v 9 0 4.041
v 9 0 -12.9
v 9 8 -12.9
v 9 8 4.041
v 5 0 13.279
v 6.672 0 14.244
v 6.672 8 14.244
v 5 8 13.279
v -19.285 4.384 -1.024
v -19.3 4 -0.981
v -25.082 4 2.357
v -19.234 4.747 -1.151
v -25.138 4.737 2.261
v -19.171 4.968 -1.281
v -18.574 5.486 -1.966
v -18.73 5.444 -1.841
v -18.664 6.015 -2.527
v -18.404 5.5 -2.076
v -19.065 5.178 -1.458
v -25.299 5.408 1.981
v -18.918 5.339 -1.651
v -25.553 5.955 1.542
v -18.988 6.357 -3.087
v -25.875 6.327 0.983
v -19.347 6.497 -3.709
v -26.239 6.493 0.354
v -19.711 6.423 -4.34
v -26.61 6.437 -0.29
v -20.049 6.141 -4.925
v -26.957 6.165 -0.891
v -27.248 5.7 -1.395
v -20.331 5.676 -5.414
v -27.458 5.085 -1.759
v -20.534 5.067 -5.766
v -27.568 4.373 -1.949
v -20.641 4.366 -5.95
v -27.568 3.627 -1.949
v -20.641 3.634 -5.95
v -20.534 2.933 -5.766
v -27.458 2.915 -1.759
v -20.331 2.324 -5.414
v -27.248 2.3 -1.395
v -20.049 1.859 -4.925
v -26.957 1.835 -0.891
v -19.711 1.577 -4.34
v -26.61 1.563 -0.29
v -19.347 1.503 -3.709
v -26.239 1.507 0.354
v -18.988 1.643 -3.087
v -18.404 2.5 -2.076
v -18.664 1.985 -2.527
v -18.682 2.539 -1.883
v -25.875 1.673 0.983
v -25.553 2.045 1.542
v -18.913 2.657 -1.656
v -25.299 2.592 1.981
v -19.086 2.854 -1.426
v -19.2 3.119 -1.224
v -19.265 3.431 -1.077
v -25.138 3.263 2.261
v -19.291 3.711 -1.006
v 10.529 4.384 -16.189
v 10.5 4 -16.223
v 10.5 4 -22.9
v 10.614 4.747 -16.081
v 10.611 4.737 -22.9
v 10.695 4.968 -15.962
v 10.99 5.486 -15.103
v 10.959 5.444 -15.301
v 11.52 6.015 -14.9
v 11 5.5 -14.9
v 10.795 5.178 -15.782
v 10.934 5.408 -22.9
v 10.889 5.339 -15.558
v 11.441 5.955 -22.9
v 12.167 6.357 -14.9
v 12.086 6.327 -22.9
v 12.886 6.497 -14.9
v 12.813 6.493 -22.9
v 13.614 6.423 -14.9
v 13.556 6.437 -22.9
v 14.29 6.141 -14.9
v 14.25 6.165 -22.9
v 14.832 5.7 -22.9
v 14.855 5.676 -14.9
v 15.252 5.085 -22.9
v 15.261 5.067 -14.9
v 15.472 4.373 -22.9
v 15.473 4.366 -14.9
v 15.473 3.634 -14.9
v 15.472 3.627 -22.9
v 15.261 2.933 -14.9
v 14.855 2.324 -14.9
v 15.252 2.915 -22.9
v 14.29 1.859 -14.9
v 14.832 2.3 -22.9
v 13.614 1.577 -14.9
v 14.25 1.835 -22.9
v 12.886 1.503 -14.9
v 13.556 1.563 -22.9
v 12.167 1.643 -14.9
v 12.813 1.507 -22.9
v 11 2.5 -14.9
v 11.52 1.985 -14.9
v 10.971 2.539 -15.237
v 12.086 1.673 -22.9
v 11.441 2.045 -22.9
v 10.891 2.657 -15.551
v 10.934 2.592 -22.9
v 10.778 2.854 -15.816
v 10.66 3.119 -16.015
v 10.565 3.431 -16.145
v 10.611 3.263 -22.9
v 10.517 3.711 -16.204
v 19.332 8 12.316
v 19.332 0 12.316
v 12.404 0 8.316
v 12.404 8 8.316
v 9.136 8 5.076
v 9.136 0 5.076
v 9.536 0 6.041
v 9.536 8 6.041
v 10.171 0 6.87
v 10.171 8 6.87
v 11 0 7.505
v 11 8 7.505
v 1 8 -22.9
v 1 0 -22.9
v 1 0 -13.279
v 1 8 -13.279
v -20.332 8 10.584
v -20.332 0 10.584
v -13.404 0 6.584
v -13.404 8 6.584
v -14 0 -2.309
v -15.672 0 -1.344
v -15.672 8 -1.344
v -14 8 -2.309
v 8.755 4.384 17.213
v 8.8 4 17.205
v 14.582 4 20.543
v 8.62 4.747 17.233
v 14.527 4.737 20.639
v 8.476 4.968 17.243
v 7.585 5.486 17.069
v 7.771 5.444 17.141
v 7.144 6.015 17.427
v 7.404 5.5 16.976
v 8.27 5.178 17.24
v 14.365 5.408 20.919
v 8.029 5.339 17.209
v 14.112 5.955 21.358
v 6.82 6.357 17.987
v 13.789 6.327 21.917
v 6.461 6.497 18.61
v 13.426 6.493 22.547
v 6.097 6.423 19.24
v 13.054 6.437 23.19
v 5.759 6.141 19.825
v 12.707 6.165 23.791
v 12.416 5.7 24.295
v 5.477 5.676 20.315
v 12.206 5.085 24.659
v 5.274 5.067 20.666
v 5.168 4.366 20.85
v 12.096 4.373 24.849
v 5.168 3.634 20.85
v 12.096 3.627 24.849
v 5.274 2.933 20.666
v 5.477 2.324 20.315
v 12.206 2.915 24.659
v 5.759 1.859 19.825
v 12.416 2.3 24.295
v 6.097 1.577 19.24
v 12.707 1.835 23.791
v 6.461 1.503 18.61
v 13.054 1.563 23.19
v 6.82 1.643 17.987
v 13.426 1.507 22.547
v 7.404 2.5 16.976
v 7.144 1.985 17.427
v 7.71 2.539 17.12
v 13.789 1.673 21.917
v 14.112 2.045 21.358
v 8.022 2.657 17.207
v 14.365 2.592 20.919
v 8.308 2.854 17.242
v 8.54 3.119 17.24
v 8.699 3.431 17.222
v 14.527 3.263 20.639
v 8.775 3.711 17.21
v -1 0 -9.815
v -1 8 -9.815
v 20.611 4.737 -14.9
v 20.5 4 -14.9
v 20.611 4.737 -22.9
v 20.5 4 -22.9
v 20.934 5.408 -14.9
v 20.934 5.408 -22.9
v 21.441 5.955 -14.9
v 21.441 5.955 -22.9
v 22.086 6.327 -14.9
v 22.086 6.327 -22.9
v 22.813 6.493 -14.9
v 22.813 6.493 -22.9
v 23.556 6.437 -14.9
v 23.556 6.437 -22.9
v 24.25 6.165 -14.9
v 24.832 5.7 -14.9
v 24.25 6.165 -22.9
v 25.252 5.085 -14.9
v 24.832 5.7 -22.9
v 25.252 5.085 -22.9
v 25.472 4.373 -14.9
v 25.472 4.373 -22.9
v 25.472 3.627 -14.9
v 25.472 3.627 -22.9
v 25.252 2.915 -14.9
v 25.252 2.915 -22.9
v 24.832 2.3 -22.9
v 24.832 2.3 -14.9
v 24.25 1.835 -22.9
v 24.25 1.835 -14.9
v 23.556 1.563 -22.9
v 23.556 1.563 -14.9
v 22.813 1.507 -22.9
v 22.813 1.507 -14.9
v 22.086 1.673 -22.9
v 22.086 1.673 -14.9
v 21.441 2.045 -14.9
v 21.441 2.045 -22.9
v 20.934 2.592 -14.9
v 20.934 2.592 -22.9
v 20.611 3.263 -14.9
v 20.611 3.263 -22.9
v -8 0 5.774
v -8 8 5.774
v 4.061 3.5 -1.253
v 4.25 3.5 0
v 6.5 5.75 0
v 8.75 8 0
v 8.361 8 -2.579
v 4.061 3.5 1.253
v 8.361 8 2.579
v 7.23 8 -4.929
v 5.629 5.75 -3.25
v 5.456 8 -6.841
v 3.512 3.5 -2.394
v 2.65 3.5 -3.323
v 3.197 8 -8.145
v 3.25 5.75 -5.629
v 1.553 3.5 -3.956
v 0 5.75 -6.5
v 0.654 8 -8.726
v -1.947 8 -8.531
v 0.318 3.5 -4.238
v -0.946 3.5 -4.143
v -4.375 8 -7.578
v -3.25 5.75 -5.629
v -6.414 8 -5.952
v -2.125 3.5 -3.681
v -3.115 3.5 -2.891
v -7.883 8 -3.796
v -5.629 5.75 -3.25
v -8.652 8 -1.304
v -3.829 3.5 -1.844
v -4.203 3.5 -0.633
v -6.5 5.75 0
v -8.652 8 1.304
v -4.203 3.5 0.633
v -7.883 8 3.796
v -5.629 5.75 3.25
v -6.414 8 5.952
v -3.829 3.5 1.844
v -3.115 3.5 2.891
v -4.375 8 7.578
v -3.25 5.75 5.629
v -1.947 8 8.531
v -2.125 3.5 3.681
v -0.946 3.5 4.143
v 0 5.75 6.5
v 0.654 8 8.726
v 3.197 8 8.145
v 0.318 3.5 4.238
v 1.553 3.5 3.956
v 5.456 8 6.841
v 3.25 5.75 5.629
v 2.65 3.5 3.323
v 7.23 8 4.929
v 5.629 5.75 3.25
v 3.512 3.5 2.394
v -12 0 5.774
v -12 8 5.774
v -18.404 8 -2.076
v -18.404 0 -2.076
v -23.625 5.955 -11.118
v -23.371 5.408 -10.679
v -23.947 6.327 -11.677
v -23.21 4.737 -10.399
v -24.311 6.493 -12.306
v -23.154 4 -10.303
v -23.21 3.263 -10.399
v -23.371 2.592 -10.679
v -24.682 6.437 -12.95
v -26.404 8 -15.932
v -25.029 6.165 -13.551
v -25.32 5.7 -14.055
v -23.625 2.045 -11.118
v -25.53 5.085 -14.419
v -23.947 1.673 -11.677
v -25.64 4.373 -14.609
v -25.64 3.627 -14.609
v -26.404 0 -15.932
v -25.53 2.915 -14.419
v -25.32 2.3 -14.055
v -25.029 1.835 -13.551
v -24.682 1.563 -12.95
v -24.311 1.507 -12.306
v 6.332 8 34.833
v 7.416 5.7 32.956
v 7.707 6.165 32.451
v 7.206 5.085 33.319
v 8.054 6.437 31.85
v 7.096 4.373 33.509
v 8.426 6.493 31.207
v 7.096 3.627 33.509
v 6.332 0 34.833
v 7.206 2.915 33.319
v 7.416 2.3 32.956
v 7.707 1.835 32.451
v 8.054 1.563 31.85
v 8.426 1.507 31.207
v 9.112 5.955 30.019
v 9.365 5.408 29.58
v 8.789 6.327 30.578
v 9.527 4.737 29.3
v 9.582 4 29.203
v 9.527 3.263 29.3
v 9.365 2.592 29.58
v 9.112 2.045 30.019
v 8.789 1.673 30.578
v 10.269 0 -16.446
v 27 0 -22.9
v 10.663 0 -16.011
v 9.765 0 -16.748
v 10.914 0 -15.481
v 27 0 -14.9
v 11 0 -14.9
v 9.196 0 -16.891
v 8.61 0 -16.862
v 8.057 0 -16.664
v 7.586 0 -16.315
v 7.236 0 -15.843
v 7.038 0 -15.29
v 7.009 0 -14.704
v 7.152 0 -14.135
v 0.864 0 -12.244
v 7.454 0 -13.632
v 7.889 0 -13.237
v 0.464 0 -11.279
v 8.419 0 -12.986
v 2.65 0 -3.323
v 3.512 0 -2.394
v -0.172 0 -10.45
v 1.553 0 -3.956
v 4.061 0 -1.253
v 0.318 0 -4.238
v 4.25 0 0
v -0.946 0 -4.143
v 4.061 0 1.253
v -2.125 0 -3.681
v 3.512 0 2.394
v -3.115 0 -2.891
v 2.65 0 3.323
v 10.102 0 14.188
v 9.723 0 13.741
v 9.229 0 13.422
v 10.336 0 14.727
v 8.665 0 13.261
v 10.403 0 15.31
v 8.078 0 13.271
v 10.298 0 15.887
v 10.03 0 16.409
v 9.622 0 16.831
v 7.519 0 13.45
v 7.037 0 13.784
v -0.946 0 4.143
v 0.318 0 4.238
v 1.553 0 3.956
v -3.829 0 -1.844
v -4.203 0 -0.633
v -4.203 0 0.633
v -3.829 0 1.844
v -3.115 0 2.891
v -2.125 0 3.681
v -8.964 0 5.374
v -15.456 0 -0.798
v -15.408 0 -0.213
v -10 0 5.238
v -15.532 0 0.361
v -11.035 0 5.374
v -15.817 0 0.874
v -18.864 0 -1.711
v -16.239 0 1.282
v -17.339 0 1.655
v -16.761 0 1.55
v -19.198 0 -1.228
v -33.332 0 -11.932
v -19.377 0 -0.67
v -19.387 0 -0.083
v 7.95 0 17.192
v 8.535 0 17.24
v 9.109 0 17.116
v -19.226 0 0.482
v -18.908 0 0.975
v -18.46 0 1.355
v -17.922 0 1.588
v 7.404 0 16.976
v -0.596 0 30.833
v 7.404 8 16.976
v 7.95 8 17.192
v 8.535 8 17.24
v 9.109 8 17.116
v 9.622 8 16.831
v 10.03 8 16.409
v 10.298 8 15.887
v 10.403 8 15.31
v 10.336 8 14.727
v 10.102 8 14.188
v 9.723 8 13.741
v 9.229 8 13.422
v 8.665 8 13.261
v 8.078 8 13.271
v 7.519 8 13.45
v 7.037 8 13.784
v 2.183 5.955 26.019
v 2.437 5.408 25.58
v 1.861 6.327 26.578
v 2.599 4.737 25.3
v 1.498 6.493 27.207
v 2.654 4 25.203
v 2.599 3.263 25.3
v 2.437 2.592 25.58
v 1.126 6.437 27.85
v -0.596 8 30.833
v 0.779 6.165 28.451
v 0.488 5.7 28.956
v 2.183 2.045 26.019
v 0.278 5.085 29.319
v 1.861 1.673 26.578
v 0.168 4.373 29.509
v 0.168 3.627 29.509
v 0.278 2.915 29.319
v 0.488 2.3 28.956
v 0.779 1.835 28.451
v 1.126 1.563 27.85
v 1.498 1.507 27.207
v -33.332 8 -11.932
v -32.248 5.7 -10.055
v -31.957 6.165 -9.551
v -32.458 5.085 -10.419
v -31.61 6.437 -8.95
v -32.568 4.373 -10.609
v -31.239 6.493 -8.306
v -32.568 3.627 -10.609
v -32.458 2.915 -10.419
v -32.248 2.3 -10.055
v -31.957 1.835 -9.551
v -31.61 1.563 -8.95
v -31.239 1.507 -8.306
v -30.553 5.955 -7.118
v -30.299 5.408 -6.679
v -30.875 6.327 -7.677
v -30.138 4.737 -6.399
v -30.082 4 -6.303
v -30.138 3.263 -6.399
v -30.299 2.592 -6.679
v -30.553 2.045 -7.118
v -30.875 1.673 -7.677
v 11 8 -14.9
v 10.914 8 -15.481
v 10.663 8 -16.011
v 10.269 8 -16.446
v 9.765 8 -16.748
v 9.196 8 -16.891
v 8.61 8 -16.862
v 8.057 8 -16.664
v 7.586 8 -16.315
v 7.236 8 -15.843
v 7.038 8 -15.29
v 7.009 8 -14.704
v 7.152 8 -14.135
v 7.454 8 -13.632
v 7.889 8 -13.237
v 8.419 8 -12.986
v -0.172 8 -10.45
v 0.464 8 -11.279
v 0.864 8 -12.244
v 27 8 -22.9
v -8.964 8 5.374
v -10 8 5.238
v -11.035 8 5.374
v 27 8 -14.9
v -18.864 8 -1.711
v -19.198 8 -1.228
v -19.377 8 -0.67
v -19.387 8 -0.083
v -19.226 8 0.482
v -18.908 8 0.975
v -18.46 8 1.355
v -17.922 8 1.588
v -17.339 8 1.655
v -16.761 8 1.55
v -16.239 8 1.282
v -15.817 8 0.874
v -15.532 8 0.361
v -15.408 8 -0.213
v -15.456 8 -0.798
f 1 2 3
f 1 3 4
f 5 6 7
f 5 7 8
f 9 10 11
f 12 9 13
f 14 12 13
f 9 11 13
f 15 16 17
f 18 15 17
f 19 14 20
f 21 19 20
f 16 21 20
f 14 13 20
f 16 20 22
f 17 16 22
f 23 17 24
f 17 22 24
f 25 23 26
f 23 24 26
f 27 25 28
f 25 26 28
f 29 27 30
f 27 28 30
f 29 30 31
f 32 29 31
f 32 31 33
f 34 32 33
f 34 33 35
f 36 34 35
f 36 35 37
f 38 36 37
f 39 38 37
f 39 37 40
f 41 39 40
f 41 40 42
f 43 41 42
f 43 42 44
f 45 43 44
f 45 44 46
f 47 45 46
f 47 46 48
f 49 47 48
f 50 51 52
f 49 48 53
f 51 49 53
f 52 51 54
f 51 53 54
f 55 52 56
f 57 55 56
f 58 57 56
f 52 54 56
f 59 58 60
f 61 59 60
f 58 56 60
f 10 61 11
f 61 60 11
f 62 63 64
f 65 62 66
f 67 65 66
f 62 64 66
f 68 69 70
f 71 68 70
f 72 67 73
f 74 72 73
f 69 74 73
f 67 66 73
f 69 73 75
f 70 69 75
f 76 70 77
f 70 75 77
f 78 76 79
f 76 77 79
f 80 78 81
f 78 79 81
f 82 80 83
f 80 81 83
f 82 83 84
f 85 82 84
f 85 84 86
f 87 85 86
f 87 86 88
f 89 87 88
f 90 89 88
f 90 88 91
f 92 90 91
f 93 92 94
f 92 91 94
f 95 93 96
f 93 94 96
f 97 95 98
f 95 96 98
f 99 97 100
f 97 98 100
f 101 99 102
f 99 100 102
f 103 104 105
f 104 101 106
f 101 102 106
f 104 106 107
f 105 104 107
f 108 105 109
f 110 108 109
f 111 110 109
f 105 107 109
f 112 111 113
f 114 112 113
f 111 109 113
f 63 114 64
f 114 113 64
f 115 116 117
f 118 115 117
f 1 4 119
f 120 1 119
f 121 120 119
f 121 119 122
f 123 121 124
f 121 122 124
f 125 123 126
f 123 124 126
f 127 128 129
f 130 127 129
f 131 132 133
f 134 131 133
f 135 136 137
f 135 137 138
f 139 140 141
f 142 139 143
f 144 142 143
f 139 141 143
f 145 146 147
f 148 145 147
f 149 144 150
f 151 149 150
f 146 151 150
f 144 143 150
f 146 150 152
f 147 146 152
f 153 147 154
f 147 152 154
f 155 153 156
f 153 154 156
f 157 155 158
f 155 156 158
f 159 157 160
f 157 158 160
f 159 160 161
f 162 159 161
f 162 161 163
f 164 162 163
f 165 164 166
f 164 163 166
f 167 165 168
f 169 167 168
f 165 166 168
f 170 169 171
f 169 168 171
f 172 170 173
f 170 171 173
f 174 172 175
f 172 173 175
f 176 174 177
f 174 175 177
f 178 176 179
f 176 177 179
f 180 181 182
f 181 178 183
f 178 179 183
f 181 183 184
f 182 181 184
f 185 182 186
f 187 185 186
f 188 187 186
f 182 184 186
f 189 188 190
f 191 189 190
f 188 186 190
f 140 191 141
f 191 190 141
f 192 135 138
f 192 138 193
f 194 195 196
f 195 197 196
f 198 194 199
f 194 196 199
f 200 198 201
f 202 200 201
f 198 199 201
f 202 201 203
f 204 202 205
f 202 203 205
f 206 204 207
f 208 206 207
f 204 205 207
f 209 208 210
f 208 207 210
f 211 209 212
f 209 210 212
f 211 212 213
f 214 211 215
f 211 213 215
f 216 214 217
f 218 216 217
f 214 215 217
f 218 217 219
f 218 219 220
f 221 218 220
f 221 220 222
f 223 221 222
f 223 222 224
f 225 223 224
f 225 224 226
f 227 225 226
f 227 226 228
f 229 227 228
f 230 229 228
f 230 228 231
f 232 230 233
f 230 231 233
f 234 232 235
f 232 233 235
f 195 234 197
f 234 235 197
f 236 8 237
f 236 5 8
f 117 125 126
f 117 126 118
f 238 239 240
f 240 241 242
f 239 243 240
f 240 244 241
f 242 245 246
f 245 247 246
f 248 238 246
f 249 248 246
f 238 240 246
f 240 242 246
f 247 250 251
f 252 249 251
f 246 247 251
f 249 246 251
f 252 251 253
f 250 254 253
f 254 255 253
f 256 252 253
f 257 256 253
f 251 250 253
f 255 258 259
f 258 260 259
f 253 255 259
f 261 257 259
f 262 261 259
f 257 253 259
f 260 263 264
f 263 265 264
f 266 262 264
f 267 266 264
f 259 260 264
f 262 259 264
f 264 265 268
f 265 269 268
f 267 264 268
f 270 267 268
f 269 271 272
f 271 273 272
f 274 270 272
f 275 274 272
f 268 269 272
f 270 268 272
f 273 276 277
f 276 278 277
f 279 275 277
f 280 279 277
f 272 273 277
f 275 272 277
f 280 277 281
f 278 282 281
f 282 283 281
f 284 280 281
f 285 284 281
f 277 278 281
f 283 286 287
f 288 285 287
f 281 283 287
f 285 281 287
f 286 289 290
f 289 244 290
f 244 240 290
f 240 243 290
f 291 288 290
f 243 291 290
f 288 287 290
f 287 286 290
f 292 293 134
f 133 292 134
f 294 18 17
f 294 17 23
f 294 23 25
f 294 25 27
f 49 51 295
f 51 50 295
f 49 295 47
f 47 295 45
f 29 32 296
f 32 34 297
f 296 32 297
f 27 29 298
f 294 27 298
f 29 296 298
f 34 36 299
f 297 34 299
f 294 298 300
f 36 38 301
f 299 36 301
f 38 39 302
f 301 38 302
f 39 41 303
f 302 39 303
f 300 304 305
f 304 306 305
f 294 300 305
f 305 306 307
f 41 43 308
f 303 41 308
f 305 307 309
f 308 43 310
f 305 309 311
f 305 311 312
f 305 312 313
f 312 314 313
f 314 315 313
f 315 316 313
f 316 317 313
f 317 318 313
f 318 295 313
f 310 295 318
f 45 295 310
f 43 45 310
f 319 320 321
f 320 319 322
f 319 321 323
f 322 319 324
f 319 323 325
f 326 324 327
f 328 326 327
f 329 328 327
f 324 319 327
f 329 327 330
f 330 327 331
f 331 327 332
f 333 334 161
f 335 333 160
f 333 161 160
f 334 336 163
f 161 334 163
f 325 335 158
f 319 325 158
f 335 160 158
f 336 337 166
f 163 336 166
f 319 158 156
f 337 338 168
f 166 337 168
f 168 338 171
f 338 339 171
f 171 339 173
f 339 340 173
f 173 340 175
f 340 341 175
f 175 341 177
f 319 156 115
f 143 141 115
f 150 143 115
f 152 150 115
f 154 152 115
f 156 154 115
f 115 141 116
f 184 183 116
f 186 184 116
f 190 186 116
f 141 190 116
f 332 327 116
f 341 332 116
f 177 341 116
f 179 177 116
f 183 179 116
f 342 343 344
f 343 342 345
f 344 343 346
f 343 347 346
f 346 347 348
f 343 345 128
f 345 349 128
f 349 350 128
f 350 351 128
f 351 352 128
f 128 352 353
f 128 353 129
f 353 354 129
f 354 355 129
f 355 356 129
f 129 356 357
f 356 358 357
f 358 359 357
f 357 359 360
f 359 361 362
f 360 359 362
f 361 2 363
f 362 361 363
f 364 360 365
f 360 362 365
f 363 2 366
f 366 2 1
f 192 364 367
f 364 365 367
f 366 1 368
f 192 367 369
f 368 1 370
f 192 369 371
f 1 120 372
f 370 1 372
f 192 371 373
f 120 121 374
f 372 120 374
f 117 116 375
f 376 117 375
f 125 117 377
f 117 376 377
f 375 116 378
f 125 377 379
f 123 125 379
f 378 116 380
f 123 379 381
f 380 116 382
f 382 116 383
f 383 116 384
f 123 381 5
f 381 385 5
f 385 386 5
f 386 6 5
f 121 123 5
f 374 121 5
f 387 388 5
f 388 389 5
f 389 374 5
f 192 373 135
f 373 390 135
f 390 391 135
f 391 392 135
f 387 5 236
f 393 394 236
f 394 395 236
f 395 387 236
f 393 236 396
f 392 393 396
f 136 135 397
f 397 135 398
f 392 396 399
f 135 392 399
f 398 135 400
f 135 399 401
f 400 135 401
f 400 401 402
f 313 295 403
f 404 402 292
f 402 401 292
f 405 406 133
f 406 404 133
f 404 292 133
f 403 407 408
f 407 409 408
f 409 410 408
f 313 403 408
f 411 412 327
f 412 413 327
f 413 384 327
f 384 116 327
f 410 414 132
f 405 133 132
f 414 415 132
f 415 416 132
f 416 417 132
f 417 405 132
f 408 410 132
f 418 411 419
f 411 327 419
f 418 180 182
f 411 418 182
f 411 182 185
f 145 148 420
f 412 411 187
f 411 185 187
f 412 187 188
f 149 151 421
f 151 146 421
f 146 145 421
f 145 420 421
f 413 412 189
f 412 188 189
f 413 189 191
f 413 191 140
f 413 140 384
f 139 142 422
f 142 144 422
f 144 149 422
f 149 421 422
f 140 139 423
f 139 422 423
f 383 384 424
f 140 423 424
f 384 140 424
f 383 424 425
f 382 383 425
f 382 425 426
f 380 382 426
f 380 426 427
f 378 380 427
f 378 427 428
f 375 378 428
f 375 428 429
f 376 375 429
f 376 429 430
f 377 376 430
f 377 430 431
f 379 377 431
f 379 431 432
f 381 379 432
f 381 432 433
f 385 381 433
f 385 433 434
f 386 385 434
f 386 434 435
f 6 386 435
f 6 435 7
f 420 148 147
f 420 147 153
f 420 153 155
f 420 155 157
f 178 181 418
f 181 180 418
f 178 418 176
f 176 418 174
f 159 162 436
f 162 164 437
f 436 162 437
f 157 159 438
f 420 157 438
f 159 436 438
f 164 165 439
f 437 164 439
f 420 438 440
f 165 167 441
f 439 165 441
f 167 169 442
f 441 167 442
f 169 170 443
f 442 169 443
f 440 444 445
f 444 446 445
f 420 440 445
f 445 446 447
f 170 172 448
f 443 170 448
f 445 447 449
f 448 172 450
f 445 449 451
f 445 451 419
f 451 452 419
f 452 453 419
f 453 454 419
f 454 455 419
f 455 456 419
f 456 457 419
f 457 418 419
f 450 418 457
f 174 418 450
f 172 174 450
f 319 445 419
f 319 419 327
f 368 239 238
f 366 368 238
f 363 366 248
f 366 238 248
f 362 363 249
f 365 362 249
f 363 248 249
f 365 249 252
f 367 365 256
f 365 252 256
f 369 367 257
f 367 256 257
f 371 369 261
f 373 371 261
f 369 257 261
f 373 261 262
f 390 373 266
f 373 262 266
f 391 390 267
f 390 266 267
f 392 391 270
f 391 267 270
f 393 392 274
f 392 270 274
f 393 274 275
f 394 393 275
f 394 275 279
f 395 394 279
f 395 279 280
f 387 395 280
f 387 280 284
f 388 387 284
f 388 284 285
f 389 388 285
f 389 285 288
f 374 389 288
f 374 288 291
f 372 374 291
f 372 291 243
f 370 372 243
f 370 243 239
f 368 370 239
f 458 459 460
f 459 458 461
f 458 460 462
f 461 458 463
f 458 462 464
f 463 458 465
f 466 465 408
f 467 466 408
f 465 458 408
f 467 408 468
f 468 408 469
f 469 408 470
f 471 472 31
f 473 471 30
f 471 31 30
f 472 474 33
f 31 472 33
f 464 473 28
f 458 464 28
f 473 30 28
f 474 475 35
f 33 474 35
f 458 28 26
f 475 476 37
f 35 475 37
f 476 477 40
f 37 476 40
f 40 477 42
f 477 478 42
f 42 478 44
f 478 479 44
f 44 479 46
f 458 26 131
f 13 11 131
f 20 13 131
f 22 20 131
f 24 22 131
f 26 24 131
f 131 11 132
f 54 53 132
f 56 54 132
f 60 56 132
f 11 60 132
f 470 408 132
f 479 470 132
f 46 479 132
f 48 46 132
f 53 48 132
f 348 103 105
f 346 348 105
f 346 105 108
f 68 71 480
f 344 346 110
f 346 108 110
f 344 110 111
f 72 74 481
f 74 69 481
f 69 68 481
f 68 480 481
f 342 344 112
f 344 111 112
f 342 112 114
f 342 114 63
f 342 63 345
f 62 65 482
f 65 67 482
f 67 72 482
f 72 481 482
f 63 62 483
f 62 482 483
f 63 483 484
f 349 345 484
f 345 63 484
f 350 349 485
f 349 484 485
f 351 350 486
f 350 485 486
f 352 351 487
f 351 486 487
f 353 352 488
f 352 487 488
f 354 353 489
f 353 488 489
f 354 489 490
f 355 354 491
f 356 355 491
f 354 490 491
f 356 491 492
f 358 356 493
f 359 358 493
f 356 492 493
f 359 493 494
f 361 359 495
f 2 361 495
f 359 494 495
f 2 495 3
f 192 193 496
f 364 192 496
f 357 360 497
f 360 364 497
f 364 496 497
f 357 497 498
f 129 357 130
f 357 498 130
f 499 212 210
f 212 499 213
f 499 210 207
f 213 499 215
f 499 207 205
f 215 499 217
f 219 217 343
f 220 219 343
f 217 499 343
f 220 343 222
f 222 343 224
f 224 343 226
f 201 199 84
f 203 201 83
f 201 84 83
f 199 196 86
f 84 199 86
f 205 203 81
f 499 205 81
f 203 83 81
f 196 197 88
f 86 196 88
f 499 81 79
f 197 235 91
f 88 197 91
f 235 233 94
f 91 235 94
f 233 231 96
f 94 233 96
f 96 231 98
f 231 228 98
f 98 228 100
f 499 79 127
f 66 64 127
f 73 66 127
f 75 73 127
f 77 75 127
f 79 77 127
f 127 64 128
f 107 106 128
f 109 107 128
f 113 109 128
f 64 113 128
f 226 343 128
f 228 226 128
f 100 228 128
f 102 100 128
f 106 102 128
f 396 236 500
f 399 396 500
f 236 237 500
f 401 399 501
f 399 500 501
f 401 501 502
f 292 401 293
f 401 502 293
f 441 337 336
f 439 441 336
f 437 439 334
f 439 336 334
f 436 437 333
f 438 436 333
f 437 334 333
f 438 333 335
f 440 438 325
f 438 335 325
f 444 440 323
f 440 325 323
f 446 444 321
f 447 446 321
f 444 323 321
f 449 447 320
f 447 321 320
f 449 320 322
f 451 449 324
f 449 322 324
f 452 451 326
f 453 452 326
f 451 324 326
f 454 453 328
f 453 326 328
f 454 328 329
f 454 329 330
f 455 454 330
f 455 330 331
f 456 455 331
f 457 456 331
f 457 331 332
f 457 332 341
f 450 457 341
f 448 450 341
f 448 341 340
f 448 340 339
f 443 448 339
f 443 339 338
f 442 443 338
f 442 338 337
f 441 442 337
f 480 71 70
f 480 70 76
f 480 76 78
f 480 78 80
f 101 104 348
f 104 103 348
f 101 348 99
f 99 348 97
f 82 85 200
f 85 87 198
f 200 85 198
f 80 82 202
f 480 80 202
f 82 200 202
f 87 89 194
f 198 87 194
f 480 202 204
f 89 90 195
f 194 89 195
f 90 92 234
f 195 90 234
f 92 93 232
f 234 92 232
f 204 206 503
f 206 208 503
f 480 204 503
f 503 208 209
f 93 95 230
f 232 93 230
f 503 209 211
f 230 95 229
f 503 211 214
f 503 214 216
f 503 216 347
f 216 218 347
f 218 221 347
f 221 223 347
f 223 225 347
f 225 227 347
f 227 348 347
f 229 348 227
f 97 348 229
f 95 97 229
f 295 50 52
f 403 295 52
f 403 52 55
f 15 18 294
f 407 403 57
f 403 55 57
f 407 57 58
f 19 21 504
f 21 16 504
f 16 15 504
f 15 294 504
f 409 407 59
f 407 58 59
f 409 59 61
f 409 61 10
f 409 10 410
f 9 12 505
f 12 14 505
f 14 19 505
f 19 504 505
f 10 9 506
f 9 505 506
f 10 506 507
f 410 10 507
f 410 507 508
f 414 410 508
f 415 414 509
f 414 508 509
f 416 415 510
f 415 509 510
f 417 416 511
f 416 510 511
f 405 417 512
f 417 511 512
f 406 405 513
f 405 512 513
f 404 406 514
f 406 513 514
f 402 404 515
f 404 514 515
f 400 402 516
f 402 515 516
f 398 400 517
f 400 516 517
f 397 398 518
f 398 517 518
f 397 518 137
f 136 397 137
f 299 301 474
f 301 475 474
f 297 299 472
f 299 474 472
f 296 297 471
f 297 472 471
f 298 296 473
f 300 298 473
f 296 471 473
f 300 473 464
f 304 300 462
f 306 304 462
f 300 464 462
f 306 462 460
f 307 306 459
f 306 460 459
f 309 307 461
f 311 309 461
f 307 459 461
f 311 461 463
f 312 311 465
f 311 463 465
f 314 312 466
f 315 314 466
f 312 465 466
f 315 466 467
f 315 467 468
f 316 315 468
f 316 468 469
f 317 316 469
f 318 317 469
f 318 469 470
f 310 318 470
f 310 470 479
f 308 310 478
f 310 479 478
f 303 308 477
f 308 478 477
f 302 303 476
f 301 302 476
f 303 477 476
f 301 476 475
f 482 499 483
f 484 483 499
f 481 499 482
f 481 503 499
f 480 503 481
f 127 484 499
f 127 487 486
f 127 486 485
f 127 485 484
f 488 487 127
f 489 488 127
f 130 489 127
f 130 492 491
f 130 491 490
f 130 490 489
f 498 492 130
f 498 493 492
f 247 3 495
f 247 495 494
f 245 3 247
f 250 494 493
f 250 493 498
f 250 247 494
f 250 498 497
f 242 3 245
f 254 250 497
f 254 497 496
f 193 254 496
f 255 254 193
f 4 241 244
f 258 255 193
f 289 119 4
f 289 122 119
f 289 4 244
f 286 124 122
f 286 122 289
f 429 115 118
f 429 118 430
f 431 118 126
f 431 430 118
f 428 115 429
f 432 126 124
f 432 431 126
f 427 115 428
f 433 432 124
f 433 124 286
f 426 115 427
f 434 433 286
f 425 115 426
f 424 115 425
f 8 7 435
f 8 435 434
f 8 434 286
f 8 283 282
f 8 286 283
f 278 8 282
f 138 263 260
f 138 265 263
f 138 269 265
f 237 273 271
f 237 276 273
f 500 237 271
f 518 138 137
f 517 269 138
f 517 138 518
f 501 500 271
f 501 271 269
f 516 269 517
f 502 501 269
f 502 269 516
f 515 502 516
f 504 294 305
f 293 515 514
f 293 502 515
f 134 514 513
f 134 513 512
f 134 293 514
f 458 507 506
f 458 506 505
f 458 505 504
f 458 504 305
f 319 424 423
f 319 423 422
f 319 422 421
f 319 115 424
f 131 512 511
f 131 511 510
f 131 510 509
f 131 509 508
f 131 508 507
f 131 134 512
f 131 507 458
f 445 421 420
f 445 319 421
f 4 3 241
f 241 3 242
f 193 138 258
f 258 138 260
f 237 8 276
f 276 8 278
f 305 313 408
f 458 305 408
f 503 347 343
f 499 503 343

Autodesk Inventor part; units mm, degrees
ref_plane "YZ Plane" through (0, 0, 0) normal (1, 0, 0) x (0, 1, 0)
ref_plane "XZ Plane" through (0, 0, 0) normal (0, 1, 0) x (-1, 0, 0)
ref_plane "XY Plane" through (0, 0, 0) normal (0, 0, 1) x (1, 0, 0)
sketch "Sketch1" plane through (0, 0, 0) normal (0, 1, 0) x (-1, 0, 0)
  line L0 (-0.9998, -14.9003) -> (-26.9998, -14.9003)
  line L1 (-26.9998, -14.9003) -> (-26.9998, -22.9003)
  line L2 (-26.9998, -22.9003) -> (-0.9998, -22.9003)
  line L3 (-0.9998, -22.9003) -> (-0.9998, -14.9003)
  line L4 (-0.9998, -14.9003) -> (-8.9998, -14.9003)
  line L5 (-8.9998, -14.9003) -> (-8.9998, -10.9694)
  line L6 (-8.9998, -10.9694) -> (-0.9998, -10.9694) construction
  line L7 (-0.9998, -10.9694) -> (-0.9998, -14.9003)
  line L8 (13.404, 6.5843) -> (26.404, -15.9324)
  line L9 (26.404, -15.9324) -> (33.3322, -11.9324)
  line L10 (33.3322, -11.9324) -> (20.3322, 10.5843)
  line L11 (20.3322, 10.5843) -> (13.404, 6.5843)
  line L12 (13.404, 6.5843) -> (17.404, -0.3439)
  line L13 (17.404, -0.3439) -> (13.9997, -2.3094)
  line L14 (13.9997, -2.3094) -> (9.9997, 4.6188) construction
  line L15 (9.9997, 4.6188) -> (13.404, 6.5843)
  line L16 (-12.4041, 8.316) -> (0.5959, 30.8327)
  line L17 (0.5959, 30.8327) -> (-6.3323, 34.8327)
  line L18 (-6.3323, 34.8327) -> (-19.3323, 12.316)
  line L19 (-19.3323, 12.316) -> (-12.4041, 8.316)
  line L20 (-12.4041, 8.316) -> (-8.4041, 15.2442)
  line L21 (-8.4041, 15.2442) -> (-4.9998, 13.2788)
  line L22 (-4.9998, 13.2788) -> (-8.9998, 6.3506) construction
  line L23 (-8.9998, 6.3506) -> (-12.4041, 8.316)
  line L24 (17.9997, 0) -> (-8.9998, -15.5882)
  line L25 (-8.9998, -15.5882) -> (-8.9998, 15.5882)
  line L26 (-8.9998, 15.5882) -> (17.9997, 0)
  point P0 (0, 0)
  point P1 (0, 0)
  point P2 (17.404, -0.3439)
  dimension "d0" = 8
  dimension "d3" = 360
  dimension "d5" = 60.332
  dimension "d6" = 57.733
  dimension "d7" = 26
extrude "Extrusion1" add sketch "Sketch1" along normal blind 8
fillet "Fillet1" radius 4 3 edges at (8.9998, 4, 6.3506) (-9.9997, 4, 4.6188) (0.9998, 4, -10.9694)
sketch "Sketch2" plane through (0, 8, 0) normal (0, 1, 0) x (1, 0, 0)
  line L0 (8.9998, -4.0412) -> (8.9998, 14.9003) projected
  circle A0 centre (8.9998, 14.9003) radius 2
  line L1 (8.4041, -15.2442) -> (-0.5959, -30.8327) projected
  circle A1 centre (8.4041, -15.2442) radius 2
  line L2 (-1.0002, 9.8147) -> (-17.404, 0.3439) projected
  circle A2 centre (-17.404, 0.3439) radius 2
  circle A3 centre (0, 0) radius 4.25
  dimension "d11" = 4
  dimension "d14" = 8.5
extrude "Extrusion2" cut sketch "Sketch2" against normal blind 18.75
chamfer "Chamfer1" distance 4.5 angle 45 1 edges at (-4.25, 8, 0)
sketch "Sketch3" plane through (26.9998, 0, -22.9003) normal (0, 0, -1) x (-1, 0, 0)
  circle A0 centre (4, 4) radius 2.5
  circle A1 centre (14, 4) radius 2.5
  line L0 (0, 0) -> (26, 0) projected
  line L1 (0, 0) -> (0, 8) projected
  point P0 (26.9998, 0)
  dimension "d18" = 10
  dimension "d19" = 5
  dimension "d20" = 4
  dimension "d21" = 4
extrude "Extrusion3" cut sketch "Sketch3" against normal blind 18.75
thread "Thread1" size "M5x0.8" class "6H" standard "ISO Metric profile" length 15
thread "Thread2" size "M5x0.8" class "6H" standard "ISO Metric profile" length 15
pattern_circular "Circular Pattern1" count 3 over 360 about axis through (0, 8, 0) along (0, -1, 0) of "Extrusion3"
thread "Thread3" size "M5x0.8" class "6H" standard "ISO Metric profile" length 15
thread "Thread4" size "M5x0.8" class "6H" standard "ANSI Metric M Profile" length 15
thread "Thread5" size "M5x0.8" class "6H" standard "ISO Metric profile" length 15
thread "Thread6" size "M5x0.8" class "6H" standard "ANSI Metric M Profile" length 15
properties part number "ServoCap" material "Steel, Carbon"
